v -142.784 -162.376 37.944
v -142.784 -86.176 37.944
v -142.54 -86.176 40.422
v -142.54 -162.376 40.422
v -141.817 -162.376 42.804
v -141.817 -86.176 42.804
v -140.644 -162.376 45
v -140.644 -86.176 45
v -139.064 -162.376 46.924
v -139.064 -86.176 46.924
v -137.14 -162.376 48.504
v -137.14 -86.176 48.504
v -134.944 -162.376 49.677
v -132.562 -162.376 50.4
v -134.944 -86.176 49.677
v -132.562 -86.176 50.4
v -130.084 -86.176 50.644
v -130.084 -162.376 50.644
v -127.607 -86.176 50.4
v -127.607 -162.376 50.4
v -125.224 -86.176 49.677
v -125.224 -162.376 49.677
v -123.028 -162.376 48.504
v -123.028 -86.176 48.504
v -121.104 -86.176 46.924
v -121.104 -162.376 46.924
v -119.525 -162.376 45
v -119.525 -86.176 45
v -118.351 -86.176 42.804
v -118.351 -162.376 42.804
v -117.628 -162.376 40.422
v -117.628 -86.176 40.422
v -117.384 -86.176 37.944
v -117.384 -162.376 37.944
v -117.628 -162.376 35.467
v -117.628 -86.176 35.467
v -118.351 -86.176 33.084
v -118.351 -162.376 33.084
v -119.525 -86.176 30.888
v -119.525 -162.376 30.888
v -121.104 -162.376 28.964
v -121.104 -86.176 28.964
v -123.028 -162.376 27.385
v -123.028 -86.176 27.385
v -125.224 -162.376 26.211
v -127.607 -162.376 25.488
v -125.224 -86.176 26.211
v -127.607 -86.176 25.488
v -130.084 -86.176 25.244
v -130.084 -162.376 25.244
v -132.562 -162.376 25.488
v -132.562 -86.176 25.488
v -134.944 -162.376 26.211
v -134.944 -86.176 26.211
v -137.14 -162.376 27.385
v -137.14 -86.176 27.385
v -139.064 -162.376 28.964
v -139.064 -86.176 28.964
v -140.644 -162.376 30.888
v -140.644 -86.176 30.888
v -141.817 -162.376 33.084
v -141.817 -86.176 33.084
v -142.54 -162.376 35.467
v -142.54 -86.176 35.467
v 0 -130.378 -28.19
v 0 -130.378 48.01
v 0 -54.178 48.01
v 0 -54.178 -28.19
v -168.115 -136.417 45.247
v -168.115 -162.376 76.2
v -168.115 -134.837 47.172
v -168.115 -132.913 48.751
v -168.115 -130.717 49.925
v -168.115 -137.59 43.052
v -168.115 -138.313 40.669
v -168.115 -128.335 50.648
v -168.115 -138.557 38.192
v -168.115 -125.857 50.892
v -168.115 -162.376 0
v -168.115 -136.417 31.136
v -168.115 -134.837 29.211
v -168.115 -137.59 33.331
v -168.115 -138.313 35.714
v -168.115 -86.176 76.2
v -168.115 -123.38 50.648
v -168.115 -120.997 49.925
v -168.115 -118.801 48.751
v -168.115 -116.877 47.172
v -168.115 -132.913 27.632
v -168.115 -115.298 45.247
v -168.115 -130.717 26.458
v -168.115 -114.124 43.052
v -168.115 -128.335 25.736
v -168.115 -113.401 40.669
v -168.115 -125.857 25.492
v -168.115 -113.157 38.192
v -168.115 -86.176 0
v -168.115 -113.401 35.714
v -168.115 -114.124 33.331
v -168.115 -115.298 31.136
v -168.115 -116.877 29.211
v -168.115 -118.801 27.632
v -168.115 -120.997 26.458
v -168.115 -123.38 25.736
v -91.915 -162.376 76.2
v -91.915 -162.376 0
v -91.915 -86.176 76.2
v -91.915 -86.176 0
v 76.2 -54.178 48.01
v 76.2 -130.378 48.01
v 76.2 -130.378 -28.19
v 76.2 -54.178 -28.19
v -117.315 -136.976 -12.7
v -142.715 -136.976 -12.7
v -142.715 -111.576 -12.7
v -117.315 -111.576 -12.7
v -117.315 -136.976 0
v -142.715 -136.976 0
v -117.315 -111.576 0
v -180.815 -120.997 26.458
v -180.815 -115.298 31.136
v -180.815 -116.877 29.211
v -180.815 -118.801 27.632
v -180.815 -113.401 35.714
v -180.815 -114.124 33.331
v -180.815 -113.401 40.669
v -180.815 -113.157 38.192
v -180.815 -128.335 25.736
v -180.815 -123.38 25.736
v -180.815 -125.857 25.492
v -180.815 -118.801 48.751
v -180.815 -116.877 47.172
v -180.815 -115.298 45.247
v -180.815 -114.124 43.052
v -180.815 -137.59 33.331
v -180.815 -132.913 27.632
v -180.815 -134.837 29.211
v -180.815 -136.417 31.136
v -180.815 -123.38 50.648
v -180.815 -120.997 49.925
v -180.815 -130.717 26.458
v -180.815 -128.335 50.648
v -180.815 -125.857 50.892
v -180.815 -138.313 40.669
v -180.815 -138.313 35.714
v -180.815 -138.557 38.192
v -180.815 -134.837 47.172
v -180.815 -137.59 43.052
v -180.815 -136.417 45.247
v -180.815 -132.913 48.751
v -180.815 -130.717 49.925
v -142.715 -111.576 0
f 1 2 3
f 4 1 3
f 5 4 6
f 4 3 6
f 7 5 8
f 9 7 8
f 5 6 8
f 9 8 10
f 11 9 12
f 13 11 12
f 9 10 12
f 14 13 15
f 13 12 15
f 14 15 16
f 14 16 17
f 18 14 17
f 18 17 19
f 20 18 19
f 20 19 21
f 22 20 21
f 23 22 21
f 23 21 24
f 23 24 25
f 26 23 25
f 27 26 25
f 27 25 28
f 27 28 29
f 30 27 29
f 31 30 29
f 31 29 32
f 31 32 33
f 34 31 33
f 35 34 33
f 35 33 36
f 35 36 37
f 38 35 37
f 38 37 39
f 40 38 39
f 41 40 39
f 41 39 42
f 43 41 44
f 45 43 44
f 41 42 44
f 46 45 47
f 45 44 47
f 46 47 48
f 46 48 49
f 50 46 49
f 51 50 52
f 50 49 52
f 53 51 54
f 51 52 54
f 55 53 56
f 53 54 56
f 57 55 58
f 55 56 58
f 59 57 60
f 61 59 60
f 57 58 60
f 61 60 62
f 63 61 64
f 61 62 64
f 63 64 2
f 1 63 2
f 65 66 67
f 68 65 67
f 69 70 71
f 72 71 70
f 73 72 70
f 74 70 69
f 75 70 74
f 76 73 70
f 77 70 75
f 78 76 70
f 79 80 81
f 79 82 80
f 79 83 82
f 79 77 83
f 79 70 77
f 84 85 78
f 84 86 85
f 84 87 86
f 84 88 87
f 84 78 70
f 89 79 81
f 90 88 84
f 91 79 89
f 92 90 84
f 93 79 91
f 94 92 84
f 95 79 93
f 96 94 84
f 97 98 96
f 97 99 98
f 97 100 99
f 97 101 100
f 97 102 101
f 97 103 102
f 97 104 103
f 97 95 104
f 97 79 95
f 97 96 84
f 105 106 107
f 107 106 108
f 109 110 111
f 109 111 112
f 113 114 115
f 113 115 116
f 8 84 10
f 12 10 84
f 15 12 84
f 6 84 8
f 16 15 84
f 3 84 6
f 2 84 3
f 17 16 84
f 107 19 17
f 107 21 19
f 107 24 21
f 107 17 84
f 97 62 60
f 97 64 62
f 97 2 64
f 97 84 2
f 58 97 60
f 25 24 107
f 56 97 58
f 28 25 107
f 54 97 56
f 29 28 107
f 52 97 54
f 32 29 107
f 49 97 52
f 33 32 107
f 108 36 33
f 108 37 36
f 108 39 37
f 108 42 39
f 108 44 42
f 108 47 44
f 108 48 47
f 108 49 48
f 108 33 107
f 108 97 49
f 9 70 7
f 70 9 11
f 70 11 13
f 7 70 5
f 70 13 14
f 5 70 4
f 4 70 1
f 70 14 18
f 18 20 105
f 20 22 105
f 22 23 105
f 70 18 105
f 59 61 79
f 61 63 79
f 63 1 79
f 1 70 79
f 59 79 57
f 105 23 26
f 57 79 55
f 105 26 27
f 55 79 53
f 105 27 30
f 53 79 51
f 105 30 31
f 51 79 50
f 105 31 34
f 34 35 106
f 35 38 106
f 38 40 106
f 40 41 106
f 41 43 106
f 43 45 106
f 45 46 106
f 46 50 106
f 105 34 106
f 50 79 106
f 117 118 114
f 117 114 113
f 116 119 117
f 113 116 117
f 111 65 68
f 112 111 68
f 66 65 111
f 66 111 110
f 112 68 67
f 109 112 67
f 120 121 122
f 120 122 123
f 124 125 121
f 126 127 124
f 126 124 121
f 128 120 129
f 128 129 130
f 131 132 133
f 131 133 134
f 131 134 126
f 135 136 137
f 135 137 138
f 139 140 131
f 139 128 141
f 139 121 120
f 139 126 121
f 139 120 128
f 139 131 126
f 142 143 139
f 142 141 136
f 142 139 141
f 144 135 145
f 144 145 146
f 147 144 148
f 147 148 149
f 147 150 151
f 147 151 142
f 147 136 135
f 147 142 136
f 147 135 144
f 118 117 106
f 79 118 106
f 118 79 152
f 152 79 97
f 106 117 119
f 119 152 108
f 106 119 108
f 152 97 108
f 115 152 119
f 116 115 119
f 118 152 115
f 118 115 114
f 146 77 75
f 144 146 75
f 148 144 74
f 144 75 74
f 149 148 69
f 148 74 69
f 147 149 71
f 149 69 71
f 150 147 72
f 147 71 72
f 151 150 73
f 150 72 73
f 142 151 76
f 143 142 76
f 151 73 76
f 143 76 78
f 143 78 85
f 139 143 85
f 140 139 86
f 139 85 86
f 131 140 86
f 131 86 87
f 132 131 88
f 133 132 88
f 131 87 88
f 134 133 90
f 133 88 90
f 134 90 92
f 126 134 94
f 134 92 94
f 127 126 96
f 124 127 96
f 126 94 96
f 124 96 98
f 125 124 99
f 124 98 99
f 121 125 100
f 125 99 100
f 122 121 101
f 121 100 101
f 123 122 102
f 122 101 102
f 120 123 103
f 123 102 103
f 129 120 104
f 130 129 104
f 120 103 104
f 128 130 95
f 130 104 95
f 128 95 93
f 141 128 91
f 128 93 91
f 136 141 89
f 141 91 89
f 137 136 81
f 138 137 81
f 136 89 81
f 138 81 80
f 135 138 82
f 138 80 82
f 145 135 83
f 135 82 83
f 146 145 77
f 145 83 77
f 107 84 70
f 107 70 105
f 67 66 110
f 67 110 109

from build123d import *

# Parameters (mm, degrees)
F0_W      = 76.2
F0_H      = 76.2
F1_DEPTH  = 76.2
F4_D      = 25.4
F5_W      = 25.4
F5_H      = 25.4
F6_DEPTH  = 12.7
F7_R      = 12.7
F8_DEPTH  = 12.7
F9_W      = 76.2
F9_H      = 76.2
F10_DEPTH = 76.2


with BuildPart() as f1:
    # F0 (on Top) → F1 (new body)
    with BuildSketch(Plane.XY):
        with Locations((-130.014847, -124.276404)):
            Rectangle(F0_W, F0_H)
    extrude(amount=F1_DEPTH)

    # F4 (through all)
    with Locations(Plane.XZ.offset(162.376404)):
        with Locations((-130.084187, 37.944168)):
            Hole(F4_D / 2)

    # F5 (on face) → F6 (join)
    with BuildSketch(Plane(origin=(0, 0, 0), x_dir=(1, 0, 0), z_dir=(0, 0, -1))):
        with Locations((-130.014847, 124.276404)):
            Rectangle(F5_W, F5_H)
    extrude(amount=F6_DEPTH)

    # F7 (on face) → F8 (join)
    with BuildSketch(Plane(origin=(-168.114847, 0, 0), x_dir=(0, -1, 0), z_dir=(-1, 0, 0))):
        with Locations((125.857219, 38.191568)):
            Circle(F7_R)
    extrude(amount=F8_DEPTH)


with BuildPart() as f10:
    # F9 (on Right) → F10 (new body)
    with BuildSketch(Plane.YZ):
        with Locations((-92.278067, 9.90998)):
            Rectangle(F9_W, F9_H)
    extrude(amount=F10_DEPTH)


solid = Compound([f1.part, f10.part])
